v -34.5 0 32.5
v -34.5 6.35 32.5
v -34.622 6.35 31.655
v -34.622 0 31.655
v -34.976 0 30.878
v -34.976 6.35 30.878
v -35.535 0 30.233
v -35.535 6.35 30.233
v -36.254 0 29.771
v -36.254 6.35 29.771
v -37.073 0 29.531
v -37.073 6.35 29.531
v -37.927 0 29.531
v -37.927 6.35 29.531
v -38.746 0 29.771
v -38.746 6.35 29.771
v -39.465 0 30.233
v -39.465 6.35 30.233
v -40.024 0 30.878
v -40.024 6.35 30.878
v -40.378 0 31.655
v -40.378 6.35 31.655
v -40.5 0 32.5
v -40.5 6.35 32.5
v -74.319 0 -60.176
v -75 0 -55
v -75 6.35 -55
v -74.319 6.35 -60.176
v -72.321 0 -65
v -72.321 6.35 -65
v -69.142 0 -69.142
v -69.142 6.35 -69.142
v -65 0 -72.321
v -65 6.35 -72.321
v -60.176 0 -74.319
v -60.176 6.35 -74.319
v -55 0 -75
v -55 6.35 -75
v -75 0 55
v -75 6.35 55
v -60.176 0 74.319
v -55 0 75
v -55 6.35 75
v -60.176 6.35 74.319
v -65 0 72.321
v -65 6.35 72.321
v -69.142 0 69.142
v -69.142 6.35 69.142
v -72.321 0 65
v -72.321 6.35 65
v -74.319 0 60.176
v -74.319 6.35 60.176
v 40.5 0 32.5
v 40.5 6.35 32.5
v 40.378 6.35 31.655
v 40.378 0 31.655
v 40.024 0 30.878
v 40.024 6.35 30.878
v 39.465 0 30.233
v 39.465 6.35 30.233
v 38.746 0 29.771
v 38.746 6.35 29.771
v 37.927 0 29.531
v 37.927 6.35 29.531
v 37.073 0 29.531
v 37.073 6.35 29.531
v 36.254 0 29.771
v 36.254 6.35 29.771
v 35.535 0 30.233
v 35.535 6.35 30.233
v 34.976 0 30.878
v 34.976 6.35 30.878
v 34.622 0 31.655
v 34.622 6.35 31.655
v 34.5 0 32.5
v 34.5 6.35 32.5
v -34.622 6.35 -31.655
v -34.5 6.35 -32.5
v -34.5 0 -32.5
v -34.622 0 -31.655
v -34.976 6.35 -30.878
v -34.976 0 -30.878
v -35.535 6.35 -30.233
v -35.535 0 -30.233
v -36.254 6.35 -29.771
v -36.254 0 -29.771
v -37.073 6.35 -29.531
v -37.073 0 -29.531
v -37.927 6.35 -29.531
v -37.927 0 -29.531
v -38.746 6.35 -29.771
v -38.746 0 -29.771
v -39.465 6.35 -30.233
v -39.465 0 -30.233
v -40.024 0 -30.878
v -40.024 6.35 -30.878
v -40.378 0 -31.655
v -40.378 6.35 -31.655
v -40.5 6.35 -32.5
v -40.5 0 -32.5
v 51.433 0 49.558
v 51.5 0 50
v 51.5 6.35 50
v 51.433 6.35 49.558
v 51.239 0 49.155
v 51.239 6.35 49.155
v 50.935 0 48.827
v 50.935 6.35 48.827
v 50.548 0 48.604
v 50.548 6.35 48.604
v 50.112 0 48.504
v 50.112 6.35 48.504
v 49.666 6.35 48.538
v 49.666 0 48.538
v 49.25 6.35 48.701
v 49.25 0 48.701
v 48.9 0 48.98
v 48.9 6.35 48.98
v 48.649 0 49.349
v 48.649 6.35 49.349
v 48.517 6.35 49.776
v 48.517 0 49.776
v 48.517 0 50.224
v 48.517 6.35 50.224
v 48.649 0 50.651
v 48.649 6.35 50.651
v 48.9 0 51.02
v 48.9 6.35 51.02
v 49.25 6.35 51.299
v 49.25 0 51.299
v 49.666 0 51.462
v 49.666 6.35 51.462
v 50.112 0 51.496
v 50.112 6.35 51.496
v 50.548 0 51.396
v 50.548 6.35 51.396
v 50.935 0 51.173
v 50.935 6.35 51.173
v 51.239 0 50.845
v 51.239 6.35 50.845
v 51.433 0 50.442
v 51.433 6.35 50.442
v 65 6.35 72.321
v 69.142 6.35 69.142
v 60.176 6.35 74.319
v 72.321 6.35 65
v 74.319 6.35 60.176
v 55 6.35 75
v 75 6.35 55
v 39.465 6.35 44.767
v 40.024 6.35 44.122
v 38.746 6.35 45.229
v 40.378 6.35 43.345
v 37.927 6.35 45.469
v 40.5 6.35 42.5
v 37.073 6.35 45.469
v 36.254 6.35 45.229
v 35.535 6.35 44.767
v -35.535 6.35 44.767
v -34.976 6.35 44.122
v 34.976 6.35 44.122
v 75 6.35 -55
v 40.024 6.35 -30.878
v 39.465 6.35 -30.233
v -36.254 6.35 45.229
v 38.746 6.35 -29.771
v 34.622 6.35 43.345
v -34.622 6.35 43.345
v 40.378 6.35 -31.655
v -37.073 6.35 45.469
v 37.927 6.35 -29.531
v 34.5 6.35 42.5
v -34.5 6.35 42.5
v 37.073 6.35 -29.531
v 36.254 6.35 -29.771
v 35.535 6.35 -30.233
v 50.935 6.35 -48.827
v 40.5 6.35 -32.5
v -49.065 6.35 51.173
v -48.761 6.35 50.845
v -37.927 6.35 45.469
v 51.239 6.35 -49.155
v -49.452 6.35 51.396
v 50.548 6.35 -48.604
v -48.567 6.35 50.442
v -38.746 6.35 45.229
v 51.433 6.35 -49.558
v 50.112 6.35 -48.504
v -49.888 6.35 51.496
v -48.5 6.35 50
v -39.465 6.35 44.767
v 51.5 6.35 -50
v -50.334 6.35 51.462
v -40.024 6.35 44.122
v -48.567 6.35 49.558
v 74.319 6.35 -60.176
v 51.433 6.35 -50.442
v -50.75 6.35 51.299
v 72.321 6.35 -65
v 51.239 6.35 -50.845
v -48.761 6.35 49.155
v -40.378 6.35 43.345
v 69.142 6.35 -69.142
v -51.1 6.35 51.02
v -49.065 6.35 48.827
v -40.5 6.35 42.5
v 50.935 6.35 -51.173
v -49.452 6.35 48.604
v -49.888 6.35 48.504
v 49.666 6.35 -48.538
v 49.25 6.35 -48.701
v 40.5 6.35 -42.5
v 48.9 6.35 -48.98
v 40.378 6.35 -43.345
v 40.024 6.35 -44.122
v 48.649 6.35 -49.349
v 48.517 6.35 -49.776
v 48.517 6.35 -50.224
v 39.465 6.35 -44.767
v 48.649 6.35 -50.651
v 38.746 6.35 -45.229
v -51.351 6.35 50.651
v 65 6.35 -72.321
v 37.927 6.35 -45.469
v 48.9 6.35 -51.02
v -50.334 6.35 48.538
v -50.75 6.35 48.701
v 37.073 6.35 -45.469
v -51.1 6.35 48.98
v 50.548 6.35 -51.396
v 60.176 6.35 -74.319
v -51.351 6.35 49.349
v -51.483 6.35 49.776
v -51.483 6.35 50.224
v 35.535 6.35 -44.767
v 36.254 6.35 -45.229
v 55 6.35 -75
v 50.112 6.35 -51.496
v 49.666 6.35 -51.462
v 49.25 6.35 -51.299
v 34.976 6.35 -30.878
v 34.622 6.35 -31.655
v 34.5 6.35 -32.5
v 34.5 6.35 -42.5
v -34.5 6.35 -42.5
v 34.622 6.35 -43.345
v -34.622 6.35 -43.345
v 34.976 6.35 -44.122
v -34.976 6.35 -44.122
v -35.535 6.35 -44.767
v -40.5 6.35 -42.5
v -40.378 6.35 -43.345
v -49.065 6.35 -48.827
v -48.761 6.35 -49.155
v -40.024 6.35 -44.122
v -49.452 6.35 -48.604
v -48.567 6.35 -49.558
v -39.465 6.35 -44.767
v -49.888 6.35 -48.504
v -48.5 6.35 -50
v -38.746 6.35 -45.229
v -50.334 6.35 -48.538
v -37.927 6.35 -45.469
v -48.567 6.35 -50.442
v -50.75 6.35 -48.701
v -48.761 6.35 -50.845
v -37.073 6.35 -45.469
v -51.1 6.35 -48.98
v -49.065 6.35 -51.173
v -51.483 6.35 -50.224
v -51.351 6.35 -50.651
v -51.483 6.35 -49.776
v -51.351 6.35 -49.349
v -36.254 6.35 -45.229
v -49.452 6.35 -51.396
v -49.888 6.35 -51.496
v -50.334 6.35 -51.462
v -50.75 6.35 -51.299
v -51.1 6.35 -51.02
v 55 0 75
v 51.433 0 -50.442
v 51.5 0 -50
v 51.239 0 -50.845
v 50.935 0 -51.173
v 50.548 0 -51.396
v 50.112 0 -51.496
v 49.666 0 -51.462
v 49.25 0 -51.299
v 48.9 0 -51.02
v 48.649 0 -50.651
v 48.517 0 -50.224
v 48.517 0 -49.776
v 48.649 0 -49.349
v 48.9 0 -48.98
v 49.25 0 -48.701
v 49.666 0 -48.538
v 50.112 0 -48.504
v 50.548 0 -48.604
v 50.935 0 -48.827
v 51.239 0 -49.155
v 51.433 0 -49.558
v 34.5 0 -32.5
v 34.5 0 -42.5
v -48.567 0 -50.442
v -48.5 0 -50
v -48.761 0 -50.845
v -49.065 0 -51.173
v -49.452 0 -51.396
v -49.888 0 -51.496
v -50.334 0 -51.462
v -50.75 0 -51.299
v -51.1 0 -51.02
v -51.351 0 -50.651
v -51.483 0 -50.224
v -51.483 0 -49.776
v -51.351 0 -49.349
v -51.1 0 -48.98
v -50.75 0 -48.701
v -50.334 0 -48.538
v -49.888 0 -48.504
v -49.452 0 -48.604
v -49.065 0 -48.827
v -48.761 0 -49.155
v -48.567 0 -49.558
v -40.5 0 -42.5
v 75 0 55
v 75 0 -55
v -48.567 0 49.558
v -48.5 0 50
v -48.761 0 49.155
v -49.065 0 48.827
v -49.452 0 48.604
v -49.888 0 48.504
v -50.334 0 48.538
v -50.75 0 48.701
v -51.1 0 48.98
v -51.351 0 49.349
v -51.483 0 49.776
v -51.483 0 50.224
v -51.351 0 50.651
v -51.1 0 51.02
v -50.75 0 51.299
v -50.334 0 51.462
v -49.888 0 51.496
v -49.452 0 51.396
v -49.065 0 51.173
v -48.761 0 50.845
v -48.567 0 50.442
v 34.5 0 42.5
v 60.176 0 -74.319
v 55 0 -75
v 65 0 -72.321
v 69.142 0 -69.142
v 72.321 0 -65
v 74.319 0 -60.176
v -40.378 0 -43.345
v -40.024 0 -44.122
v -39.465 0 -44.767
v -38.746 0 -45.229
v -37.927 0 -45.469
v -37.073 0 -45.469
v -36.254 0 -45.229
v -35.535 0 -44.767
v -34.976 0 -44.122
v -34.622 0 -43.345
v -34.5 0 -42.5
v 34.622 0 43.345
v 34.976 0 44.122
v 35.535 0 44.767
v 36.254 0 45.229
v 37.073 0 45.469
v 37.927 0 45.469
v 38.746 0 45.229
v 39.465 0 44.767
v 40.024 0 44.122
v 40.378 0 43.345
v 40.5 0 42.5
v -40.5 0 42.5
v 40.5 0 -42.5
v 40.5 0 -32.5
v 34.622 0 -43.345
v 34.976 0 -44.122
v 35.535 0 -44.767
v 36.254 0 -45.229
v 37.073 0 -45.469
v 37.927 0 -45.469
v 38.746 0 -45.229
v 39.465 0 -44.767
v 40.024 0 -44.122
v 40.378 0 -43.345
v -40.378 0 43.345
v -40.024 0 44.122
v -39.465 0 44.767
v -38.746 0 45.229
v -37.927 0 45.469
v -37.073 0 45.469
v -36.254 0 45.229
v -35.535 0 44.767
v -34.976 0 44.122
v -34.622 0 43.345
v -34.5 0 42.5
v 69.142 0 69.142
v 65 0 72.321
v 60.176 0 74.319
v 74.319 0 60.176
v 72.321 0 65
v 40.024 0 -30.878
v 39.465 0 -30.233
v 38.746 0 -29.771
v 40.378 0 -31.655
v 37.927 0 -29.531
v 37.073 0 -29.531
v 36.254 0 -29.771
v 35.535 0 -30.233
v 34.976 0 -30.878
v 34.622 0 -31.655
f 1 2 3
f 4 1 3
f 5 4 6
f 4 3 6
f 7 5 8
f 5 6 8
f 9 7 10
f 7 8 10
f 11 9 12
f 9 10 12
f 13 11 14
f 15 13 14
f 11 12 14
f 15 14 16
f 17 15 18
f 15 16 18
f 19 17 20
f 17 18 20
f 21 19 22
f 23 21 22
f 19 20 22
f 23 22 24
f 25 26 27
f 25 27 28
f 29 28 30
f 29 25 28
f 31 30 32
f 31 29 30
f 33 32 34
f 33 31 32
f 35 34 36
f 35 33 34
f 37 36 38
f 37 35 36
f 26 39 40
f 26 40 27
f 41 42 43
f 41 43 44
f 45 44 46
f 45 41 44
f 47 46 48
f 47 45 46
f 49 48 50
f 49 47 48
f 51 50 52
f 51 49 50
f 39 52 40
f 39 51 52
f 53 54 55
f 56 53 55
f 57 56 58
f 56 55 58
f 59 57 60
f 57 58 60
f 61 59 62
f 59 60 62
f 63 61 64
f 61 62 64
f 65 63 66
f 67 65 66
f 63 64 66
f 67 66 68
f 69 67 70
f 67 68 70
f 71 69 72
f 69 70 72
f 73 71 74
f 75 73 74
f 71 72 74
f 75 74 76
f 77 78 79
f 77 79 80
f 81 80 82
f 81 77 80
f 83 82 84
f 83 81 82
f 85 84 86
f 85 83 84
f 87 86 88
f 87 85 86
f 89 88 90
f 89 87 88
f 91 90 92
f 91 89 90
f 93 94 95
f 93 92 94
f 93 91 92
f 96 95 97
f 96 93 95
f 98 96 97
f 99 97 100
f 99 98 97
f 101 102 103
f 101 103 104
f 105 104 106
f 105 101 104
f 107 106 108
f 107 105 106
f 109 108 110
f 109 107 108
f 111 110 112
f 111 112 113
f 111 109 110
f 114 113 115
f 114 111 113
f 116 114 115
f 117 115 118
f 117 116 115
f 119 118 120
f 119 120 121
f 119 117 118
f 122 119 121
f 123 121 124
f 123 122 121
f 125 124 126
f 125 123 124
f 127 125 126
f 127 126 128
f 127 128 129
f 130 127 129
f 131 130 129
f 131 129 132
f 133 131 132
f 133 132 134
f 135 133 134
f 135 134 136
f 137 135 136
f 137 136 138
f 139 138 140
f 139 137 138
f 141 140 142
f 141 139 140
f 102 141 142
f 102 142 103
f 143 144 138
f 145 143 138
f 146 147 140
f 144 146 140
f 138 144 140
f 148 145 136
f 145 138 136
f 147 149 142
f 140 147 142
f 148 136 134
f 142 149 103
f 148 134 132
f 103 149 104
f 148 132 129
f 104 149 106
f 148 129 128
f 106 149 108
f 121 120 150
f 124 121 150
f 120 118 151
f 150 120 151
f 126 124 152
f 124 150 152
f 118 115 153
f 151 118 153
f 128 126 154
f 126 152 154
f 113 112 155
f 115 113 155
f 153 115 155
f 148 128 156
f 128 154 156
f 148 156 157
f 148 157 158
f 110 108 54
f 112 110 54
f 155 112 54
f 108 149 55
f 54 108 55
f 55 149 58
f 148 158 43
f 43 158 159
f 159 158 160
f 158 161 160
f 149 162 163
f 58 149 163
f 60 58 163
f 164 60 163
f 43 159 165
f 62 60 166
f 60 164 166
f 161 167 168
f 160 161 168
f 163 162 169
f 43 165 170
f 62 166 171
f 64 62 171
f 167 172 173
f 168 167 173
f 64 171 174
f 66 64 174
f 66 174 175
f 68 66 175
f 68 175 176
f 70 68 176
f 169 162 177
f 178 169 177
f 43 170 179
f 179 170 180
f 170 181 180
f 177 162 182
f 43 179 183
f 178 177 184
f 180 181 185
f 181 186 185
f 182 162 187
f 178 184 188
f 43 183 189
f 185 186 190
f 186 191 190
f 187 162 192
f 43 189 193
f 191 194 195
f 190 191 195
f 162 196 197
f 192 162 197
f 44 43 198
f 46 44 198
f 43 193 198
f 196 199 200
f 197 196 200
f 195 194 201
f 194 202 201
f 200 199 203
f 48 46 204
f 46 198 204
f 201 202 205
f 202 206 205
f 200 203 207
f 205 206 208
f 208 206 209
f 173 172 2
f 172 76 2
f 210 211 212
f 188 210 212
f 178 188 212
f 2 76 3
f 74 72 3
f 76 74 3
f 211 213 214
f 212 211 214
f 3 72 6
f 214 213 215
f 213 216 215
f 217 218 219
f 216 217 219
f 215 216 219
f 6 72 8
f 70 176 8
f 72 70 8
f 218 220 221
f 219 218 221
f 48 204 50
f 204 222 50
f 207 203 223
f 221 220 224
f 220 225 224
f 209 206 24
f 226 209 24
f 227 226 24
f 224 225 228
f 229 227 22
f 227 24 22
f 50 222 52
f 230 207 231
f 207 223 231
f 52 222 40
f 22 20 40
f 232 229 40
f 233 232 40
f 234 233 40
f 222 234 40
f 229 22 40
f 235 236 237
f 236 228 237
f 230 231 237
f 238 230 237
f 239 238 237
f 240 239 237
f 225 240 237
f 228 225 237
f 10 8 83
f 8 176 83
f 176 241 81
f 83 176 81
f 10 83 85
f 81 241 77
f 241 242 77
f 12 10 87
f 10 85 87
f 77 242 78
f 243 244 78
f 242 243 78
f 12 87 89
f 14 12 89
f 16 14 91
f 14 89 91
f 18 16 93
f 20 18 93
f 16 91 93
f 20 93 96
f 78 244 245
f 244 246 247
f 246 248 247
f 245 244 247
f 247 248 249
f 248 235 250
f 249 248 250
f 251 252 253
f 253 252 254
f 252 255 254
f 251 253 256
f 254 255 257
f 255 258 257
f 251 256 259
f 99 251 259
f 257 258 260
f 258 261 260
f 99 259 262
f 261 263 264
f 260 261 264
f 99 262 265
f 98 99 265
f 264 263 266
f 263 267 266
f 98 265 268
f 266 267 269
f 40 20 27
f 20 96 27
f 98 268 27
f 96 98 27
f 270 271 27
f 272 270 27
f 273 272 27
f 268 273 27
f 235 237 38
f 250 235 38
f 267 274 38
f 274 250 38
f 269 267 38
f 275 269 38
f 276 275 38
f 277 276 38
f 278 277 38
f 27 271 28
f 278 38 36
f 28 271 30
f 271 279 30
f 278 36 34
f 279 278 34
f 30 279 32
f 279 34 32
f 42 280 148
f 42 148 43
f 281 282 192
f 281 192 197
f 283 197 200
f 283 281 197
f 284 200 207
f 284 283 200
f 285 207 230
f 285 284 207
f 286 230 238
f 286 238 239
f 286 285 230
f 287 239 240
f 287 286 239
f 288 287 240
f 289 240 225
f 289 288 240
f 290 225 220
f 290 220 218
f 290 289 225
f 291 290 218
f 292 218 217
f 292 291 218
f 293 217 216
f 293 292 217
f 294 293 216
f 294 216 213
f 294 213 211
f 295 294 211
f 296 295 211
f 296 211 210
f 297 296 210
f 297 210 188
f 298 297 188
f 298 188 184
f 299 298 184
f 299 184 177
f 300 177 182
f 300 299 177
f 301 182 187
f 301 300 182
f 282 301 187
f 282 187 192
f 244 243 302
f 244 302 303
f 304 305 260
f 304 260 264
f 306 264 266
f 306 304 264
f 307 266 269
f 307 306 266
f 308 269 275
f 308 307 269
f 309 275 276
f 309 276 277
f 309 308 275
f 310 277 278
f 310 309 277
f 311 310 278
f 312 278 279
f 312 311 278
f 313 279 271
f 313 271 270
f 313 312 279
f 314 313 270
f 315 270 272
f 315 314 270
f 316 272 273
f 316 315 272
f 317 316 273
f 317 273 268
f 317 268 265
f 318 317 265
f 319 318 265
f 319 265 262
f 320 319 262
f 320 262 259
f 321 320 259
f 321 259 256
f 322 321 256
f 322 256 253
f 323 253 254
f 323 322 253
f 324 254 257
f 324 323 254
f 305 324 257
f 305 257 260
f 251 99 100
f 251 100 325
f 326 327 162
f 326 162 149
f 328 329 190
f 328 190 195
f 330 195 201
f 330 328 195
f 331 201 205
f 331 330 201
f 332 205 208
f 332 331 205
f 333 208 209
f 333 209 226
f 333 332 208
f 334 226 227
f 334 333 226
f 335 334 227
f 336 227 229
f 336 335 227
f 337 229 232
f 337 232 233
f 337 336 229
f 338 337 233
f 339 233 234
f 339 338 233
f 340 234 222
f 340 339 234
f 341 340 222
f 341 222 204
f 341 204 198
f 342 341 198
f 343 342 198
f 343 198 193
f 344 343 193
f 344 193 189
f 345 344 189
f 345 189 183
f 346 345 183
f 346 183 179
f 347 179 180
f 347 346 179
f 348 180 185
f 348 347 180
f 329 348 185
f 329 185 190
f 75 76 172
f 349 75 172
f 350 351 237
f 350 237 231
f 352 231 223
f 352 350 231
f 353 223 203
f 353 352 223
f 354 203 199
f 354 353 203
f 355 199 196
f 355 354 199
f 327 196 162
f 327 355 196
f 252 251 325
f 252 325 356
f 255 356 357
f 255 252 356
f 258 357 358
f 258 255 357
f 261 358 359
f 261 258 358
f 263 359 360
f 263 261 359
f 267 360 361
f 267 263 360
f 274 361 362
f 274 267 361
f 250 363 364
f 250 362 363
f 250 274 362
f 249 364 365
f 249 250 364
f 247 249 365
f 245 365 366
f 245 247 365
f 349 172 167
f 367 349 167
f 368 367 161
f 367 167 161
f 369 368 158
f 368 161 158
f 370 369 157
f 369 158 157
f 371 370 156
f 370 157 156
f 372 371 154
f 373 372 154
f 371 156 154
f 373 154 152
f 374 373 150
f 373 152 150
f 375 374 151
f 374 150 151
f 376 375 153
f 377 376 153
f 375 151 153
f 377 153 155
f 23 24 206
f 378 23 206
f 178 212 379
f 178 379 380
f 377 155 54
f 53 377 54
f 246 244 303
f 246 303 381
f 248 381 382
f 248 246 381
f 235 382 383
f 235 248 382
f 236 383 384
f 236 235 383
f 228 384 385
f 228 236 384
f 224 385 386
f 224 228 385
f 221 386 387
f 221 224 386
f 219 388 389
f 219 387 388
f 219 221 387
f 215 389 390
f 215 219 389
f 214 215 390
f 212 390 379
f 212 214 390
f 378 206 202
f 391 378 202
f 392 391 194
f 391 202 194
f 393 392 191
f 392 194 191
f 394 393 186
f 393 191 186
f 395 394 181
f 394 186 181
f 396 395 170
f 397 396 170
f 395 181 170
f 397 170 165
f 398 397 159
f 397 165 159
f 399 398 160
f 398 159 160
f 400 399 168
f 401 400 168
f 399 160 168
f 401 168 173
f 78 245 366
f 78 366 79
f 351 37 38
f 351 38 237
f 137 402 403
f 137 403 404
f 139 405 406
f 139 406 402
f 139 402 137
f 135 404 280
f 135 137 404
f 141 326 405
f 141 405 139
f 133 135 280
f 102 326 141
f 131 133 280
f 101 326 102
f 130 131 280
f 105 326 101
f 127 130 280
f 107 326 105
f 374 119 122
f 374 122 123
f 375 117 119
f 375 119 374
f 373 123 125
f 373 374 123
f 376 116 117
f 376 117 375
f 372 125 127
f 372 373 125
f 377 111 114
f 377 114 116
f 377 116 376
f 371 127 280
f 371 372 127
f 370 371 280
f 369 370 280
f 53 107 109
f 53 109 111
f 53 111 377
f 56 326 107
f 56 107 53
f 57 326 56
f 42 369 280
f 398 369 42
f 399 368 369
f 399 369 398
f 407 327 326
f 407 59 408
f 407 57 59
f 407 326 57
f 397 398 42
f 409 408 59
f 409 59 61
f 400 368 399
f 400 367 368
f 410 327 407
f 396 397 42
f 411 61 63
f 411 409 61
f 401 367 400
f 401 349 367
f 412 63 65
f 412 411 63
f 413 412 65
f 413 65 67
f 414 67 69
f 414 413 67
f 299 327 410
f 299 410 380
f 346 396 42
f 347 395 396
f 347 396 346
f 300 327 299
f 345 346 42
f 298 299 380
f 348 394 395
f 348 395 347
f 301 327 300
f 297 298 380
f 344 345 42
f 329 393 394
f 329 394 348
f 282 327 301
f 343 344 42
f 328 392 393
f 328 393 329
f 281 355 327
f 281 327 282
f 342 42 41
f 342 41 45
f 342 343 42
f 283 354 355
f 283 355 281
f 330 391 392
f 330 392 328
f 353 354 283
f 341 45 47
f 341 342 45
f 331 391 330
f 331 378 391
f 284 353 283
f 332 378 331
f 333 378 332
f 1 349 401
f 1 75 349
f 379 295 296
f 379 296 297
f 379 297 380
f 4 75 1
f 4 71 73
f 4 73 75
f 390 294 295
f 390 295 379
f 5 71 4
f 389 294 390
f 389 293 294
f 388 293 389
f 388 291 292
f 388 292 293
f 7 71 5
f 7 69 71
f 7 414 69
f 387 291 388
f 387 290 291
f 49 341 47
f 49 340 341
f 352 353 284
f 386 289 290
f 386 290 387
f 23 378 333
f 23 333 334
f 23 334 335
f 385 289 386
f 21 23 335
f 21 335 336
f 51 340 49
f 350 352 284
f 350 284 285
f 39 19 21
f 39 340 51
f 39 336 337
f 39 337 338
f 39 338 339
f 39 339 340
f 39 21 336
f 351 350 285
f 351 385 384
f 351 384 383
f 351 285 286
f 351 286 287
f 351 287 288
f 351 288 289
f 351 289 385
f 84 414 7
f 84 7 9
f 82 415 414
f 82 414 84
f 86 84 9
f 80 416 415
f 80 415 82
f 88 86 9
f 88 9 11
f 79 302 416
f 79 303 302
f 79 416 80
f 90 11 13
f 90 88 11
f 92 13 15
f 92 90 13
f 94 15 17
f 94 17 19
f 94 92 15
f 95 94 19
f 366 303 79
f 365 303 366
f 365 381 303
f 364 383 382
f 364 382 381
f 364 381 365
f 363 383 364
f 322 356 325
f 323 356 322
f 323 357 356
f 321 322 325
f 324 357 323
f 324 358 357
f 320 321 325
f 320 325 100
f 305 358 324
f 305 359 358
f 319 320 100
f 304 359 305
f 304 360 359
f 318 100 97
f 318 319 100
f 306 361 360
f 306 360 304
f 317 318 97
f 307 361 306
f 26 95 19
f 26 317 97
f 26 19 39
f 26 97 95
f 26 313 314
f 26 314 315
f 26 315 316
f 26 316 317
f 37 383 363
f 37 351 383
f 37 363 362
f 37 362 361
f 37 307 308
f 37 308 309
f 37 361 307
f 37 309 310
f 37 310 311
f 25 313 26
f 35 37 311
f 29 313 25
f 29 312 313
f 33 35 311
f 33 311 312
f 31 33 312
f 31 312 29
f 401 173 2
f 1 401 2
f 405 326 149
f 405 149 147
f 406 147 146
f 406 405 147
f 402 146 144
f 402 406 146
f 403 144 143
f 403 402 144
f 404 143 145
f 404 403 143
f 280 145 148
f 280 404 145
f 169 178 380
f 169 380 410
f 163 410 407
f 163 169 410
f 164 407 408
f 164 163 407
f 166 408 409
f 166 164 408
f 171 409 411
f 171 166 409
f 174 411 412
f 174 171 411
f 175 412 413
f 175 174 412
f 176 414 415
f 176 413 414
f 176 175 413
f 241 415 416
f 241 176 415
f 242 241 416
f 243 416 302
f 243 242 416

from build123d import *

# Parameters (mm, degrees)
SKETCH1_R           = 1.5
BOSS_EXTRUDE1_DEPTH = 6.35
CUT_EXTRUDE1_DEPTH  = 10


with BuildPart() as part:
    # Sketch1 → Boss-Extrude1 (new body)
    with BuildSketch(Plane(origin=(0, 0, 0), x_dir=(1, 0, 0), z_dir=(0, 1, 0))):
        with BuildLine():
            Line((-55, 75), (55, 75))
            ThreePointArc((55, 75), (69.142135624, 69.142135624), (75, 55))
            Line((75, 55), (75, -55))
            ThreePointArc((75, -55), (69.142135624, -69.142135624), (55, -75))
            Line((55, -75), (-55, -75))
            ThreePointArc((-55, -75), (-69.142135624, -69.142135624), (-75, -55))
            Line((-75, -55), (-75, 55))
            ThreePointArc((-75, 55), (-69.142135624, 69.142135624), (-55, 75))
        make_face()
        with Locations((50, 50)):
            Circle(SKETCH1_R, mode=Mode.SUBTRACT)
        with Locations((50, -50)):
            Circle(SKETCH1_R, mode=Mode.SUBTRACT)
        with Locations((-50, -50)):
            Circle(SKETCH1_R, mode=Mode.SUBTRACT)
        with Locations((-50, 50)):
            Circle(SKETCH1_R, mode=Mode.SUBTRACT)
    extrude(amount=BOSS_EXTRUDE1_DEPTH)

    # Sketch2 → Cut-Extrude1 (cut)
    with BuildSketch(Plane(origin=(0, 6.35, 0), x_dir=(1, 0, 0), z_dir=(0, 1, 0))):
        with BuildLine():
            Line((40.5, 42.5), (40.5, 32.5))
            ThreePointArc((40.5, 32.5), (37.5, 29.5), (34.5, 32.5))
            Line((34.5, 32.5), (34.5, 42.5))
            ThreePointArc((34.5, 42.5), (37.5, 45.5), (40.5, 42.5))
        make_face()
        with BuildLine():
            Line((-34.5, 42.5), (-34.5, 32.5))
            ThreePointArc((-34.5, 32.5), (-37.5, 29.5), (-40.5, 32.5))
            Line((-40.5, 32.5), (-40.5, 42.5))
            ThreePointArc((-40.5, 42.5), (-37.5, 45.5), (-34.5, 42.5))
        make_face()
        with BuildLine():
            Line((40.5, -42.5), (40.5, -32.5))
            ThreePointArc((40.5, -32.5), (37.5, -29.5), (34.5, -32.5))
            Line((34.5, -32.5), (34.5, -42.5))
            ThreePointArc((34.5, -42.5), (37.5, -45.5), (40.5, -42.5))
        make_face()
        with BuildLine():
            Line((-34.5, -42.5), (-34.5, -32.5))
            ThreePointArc((-34.5, -32.5), (-37.5, -29.5), (-40.5, -32.5))
            Line((-40.5, -32.5), (-40.5, -42.5))
            ThreePointArc((-40.5, -42.5), (-37.5, -45.5), (-34.5, -42.5))
        make_face()
    extrude(amount=-CUT_EXTRUDE1_DEPTH, mode=Mode.SUBTRACT)


solid = part.part
